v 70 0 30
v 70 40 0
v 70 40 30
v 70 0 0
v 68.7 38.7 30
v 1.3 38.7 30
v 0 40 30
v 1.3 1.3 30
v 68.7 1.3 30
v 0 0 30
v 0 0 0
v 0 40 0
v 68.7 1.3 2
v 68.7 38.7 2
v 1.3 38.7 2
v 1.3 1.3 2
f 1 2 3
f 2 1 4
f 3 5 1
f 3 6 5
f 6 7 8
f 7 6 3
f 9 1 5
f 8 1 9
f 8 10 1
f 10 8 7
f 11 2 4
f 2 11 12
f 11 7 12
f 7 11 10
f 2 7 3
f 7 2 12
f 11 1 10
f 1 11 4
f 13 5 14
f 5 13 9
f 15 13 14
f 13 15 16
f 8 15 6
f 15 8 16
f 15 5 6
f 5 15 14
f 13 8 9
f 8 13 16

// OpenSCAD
$fn = 32;

// ----------------------------------------------------------------------
// Open box: 1.3 mm walls
// ----------------------------------------------------------------------

// --- parameters (mm) ---
box_l = 70;               // outer length, X
box_w = 40;               // outer width, Y
box_h = 30;               // outer height, Z
wall = 1.3;               // wall thickness
floor = 2;                // floor thickness

difference() {
  cube([box_l, box_w, box_h]);
  translate([wall, wall, floor])
    cube([box_l - 2 * wall, box_w - 2 * wall, box_h]);
}
